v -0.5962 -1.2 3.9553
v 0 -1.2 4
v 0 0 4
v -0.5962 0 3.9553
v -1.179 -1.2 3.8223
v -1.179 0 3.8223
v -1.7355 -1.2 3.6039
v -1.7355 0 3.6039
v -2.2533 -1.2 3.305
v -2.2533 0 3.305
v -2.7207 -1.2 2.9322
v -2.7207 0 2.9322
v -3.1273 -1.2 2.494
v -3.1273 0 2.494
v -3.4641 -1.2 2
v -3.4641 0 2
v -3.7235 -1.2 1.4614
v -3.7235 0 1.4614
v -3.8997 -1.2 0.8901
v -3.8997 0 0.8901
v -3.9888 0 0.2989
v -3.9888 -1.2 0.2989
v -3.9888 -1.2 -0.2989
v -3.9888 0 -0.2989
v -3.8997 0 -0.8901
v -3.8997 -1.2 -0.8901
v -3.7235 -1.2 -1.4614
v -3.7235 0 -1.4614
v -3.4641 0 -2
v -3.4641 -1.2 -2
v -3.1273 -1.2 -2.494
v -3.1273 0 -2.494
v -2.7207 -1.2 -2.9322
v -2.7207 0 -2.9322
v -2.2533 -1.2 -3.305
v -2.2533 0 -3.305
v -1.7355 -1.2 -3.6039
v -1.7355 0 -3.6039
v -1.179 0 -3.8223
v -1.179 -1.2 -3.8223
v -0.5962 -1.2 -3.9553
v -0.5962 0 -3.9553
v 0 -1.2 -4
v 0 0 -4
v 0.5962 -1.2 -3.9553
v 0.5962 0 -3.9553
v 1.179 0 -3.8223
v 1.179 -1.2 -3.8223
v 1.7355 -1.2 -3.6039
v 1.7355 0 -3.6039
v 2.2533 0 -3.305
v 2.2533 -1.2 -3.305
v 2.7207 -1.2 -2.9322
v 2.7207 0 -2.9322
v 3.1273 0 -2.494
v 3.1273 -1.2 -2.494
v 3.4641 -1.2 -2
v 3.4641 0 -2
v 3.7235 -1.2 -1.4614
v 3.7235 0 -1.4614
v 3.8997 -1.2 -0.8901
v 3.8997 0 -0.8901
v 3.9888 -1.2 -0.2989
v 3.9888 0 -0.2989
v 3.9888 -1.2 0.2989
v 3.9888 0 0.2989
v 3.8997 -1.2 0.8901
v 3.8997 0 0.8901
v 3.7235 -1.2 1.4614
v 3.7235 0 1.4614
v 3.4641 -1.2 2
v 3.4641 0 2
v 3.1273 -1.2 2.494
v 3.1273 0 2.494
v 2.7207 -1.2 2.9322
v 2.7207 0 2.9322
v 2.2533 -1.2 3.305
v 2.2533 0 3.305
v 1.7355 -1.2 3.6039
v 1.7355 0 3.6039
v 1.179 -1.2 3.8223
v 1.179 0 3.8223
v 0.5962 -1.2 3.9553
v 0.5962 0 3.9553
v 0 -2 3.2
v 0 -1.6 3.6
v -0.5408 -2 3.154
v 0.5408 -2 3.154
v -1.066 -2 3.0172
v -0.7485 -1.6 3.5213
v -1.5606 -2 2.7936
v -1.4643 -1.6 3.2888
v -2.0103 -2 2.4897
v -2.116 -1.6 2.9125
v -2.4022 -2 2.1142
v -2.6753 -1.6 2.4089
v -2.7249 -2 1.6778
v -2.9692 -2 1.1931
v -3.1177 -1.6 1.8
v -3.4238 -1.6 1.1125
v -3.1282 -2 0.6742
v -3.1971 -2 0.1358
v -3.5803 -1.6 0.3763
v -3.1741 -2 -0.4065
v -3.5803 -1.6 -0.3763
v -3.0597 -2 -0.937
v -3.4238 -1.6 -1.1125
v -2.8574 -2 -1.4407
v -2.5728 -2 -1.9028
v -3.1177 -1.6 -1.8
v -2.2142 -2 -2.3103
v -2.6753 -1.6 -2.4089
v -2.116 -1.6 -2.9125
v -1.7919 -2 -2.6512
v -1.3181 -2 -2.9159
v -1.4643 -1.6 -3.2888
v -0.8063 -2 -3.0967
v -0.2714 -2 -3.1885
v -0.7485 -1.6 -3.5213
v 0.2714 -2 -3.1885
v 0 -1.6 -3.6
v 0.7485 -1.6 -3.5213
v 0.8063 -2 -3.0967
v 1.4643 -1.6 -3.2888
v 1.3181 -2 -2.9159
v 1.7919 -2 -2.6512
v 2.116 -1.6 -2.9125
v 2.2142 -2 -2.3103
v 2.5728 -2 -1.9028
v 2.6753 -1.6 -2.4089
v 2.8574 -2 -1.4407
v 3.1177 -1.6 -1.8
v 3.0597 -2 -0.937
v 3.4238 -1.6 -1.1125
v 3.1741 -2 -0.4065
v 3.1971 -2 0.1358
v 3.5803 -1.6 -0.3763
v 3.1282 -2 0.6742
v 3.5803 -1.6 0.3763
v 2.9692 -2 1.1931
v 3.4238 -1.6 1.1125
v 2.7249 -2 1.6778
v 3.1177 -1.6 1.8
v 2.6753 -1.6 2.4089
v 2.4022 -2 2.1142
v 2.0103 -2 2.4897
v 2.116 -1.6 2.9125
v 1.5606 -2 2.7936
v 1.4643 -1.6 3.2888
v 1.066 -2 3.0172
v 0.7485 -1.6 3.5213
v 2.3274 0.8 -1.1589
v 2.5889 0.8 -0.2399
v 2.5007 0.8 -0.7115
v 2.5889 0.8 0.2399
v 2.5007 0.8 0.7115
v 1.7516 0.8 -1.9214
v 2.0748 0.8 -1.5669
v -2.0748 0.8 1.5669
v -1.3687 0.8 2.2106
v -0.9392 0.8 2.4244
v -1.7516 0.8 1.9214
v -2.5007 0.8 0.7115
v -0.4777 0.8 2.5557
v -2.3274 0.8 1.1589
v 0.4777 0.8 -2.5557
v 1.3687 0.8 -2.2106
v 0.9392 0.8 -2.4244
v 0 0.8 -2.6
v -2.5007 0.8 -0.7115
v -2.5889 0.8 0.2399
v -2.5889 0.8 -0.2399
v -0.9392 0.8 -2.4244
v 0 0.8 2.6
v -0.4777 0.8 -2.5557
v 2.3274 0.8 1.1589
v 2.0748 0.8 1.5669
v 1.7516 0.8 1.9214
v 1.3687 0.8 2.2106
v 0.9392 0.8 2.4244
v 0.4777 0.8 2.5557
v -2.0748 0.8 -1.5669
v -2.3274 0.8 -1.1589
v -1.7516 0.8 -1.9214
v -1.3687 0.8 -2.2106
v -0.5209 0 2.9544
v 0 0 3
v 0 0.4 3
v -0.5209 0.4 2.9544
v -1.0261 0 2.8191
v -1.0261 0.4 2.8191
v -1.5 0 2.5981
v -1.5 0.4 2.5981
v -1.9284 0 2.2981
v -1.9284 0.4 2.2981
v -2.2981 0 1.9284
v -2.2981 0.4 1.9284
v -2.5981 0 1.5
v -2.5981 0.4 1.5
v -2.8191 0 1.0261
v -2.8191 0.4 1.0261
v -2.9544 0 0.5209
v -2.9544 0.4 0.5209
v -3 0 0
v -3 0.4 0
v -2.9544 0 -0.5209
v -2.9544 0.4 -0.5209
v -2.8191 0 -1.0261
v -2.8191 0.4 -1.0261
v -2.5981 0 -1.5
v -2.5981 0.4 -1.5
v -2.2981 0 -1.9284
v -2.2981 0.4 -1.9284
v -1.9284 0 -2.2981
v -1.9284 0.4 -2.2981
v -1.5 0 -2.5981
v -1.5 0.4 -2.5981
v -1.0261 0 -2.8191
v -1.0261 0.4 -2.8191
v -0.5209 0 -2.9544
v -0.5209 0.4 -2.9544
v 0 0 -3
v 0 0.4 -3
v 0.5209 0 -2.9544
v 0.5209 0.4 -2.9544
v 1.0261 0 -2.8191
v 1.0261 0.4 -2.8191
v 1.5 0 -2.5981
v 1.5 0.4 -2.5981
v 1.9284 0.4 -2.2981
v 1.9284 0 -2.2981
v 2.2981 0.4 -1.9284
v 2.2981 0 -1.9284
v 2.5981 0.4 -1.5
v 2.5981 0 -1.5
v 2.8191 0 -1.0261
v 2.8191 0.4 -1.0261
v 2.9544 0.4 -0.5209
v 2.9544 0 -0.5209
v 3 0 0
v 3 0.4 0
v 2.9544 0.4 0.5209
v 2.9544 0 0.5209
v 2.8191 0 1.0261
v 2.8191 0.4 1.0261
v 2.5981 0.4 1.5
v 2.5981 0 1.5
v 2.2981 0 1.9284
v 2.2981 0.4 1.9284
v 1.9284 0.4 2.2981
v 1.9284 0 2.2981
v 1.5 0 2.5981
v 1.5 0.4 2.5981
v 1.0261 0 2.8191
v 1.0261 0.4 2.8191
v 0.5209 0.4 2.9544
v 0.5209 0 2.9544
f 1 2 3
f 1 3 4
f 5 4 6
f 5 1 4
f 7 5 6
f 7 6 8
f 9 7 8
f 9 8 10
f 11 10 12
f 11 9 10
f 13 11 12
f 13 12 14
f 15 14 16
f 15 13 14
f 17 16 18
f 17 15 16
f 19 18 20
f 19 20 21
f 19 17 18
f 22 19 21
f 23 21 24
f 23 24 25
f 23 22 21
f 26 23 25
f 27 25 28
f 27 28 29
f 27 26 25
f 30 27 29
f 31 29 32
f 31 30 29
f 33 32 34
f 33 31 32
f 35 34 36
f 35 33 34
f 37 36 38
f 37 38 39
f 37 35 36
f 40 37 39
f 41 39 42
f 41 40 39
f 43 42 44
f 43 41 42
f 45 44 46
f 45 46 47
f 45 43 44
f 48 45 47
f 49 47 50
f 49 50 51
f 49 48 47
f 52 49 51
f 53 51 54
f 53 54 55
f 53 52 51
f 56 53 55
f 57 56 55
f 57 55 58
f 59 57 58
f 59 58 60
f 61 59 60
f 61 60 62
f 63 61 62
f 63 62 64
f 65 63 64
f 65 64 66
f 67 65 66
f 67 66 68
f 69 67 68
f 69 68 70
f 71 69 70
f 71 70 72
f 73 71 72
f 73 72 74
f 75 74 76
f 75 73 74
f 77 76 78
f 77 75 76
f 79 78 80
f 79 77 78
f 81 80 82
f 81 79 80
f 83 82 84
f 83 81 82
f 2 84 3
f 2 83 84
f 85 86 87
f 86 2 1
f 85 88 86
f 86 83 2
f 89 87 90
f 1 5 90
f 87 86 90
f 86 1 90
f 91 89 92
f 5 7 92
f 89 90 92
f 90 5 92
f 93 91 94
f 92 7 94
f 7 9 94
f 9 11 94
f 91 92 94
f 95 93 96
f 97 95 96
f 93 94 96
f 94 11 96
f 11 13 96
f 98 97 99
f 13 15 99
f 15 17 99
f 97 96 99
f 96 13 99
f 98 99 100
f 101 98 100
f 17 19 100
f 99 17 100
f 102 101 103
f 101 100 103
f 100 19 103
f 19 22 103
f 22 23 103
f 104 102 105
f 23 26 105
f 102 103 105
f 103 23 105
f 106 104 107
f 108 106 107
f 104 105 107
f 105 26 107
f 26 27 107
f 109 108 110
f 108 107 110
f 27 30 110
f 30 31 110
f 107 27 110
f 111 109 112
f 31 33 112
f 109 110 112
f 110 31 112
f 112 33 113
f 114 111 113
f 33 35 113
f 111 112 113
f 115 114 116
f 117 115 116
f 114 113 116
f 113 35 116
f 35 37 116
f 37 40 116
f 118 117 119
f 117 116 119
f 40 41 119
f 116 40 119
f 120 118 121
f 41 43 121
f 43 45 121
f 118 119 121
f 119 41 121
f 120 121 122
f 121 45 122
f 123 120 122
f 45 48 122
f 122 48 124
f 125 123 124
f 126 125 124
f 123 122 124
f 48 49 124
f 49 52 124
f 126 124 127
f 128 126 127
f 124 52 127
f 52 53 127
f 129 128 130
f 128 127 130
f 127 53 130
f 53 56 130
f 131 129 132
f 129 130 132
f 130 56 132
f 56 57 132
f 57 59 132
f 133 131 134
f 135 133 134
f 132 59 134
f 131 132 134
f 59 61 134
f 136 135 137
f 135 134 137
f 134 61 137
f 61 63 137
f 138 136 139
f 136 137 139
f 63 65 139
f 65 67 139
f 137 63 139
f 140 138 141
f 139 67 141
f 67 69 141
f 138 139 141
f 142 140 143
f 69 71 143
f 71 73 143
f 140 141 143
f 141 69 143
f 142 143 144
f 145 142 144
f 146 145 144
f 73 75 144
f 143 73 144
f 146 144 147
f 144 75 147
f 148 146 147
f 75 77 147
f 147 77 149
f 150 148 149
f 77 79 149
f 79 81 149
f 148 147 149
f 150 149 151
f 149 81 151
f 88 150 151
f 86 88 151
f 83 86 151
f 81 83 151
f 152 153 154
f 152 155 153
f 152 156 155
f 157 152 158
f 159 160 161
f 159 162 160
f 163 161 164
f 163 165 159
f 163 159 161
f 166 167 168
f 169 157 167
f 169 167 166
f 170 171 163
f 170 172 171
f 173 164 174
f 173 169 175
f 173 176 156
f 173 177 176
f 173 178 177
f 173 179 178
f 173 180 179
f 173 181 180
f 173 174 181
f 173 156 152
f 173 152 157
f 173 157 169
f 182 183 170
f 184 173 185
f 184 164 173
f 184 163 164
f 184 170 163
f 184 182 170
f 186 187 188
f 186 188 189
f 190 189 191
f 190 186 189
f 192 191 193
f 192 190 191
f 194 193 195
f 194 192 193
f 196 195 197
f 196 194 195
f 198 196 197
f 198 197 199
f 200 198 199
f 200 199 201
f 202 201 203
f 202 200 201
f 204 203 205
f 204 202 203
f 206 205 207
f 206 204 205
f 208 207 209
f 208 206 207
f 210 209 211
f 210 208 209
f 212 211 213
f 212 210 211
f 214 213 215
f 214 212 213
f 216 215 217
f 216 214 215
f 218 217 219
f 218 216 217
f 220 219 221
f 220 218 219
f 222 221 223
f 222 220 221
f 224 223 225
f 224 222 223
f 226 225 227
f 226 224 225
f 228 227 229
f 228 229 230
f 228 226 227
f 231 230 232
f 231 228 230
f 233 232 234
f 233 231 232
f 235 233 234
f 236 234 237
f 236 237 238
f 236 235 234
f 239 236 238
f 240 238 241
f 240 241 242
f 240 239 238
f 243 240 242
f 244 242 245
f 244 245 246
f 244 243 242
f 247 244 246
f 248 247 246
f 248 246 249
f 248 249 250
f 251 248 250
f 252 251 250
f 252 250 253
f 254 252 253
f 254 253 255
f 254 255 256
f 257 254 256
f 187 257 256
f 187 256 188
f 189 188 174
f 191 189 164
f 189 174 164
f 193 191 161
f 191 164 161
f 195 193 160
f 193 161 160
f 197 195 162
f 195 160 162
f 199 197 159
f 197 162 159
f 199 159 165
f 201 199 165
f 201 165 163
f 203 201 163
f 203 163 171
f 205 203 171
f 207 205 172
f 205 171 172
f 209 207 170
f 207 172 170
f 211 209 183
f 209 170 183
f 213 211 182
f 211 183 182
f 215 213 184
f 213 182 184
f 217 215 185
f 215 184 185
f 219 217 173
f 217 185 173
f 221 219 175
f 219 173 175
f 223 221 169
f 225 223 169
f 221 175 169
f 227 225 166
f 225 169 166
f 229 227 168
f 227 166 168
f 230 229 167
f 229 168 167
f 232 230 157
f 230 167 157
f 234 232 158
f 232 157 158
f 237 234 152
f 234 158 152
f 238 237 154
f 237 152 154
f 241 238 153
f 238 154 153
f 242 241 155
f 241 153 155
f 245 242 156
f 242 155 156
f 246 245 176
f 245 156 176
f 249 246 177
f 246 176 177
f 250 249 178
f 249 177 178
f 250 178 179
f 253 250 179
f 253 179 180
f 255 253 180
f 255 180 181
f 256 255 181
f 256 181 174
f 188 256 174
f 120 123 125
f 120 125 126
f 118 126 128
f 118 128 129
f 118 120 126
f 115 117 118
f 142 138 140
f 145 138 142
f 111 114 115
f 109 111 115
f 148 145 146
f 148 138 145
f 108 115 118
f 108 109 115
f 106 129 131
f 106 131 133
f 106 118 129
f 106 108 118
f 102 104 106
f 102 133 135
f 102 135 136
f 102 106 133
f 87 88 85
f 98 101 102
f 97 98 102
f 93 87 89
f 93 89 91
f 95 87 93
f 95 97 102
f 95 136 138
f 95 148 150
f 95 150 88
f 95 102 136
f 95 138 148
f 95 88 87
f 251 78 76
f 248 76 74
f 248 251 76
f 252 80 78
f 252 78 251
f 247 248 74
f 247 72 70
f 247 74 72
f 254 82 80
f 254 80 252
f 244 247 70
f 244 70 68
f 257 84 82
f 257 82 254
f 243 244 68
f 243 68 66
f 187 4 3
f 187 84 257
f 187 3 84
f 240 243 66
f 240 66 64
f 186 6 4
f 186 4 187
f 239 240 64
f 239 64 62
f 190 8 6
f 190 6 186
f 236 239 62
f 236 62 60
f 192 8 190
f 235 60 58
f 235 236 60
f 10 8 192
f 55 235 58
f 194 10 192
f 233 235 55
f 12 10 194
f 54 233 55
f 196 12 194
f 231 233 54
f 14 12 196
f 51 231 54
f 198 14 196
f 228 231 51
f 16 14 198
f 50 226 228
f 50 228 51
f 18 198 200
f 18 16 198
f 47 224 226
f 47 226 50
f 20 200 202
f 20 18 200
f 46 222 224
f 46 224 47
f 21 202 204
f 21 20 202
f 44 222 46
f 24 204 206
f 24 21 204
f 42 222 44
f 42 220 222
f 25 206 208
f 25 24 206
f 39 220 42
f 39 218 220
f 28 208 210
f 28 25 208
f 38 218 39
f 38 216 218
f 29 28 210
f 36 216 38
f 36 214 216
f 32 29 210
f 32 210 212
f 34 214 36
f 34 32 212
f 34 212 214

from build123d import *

# Parameters (mm, degrees)
F2_SIZE = 0.8
F3_SIZE = 0.4


with BuildPart() as f1:
    # F0 (on Right) → F1 (revolve)
    with BuildSketch(Plane.YZ):
        Polygon((-2, 4), (-2, 0), (0.8, 0), (0.8, 3), (0, 3), (0, 4), align=None)
    revolve(axis=Axis((0, -0.6, 0), (0, -1, 0)))

    # F2
    f2_edges = [f1.edges().sort_by_distance(p)[0] for p in [
        (0, -2, -4),
    ]]
    chamfer(f2_edges, length=F2_SIZE)

    # F3
    f3_edges = [f1.edges().sort_by_distance(p)[0] for p in [
        (0, 0.8, -3),
    ]]
    chamfer(f3_edges, length=F3_SIZE)


solid = f1.part
